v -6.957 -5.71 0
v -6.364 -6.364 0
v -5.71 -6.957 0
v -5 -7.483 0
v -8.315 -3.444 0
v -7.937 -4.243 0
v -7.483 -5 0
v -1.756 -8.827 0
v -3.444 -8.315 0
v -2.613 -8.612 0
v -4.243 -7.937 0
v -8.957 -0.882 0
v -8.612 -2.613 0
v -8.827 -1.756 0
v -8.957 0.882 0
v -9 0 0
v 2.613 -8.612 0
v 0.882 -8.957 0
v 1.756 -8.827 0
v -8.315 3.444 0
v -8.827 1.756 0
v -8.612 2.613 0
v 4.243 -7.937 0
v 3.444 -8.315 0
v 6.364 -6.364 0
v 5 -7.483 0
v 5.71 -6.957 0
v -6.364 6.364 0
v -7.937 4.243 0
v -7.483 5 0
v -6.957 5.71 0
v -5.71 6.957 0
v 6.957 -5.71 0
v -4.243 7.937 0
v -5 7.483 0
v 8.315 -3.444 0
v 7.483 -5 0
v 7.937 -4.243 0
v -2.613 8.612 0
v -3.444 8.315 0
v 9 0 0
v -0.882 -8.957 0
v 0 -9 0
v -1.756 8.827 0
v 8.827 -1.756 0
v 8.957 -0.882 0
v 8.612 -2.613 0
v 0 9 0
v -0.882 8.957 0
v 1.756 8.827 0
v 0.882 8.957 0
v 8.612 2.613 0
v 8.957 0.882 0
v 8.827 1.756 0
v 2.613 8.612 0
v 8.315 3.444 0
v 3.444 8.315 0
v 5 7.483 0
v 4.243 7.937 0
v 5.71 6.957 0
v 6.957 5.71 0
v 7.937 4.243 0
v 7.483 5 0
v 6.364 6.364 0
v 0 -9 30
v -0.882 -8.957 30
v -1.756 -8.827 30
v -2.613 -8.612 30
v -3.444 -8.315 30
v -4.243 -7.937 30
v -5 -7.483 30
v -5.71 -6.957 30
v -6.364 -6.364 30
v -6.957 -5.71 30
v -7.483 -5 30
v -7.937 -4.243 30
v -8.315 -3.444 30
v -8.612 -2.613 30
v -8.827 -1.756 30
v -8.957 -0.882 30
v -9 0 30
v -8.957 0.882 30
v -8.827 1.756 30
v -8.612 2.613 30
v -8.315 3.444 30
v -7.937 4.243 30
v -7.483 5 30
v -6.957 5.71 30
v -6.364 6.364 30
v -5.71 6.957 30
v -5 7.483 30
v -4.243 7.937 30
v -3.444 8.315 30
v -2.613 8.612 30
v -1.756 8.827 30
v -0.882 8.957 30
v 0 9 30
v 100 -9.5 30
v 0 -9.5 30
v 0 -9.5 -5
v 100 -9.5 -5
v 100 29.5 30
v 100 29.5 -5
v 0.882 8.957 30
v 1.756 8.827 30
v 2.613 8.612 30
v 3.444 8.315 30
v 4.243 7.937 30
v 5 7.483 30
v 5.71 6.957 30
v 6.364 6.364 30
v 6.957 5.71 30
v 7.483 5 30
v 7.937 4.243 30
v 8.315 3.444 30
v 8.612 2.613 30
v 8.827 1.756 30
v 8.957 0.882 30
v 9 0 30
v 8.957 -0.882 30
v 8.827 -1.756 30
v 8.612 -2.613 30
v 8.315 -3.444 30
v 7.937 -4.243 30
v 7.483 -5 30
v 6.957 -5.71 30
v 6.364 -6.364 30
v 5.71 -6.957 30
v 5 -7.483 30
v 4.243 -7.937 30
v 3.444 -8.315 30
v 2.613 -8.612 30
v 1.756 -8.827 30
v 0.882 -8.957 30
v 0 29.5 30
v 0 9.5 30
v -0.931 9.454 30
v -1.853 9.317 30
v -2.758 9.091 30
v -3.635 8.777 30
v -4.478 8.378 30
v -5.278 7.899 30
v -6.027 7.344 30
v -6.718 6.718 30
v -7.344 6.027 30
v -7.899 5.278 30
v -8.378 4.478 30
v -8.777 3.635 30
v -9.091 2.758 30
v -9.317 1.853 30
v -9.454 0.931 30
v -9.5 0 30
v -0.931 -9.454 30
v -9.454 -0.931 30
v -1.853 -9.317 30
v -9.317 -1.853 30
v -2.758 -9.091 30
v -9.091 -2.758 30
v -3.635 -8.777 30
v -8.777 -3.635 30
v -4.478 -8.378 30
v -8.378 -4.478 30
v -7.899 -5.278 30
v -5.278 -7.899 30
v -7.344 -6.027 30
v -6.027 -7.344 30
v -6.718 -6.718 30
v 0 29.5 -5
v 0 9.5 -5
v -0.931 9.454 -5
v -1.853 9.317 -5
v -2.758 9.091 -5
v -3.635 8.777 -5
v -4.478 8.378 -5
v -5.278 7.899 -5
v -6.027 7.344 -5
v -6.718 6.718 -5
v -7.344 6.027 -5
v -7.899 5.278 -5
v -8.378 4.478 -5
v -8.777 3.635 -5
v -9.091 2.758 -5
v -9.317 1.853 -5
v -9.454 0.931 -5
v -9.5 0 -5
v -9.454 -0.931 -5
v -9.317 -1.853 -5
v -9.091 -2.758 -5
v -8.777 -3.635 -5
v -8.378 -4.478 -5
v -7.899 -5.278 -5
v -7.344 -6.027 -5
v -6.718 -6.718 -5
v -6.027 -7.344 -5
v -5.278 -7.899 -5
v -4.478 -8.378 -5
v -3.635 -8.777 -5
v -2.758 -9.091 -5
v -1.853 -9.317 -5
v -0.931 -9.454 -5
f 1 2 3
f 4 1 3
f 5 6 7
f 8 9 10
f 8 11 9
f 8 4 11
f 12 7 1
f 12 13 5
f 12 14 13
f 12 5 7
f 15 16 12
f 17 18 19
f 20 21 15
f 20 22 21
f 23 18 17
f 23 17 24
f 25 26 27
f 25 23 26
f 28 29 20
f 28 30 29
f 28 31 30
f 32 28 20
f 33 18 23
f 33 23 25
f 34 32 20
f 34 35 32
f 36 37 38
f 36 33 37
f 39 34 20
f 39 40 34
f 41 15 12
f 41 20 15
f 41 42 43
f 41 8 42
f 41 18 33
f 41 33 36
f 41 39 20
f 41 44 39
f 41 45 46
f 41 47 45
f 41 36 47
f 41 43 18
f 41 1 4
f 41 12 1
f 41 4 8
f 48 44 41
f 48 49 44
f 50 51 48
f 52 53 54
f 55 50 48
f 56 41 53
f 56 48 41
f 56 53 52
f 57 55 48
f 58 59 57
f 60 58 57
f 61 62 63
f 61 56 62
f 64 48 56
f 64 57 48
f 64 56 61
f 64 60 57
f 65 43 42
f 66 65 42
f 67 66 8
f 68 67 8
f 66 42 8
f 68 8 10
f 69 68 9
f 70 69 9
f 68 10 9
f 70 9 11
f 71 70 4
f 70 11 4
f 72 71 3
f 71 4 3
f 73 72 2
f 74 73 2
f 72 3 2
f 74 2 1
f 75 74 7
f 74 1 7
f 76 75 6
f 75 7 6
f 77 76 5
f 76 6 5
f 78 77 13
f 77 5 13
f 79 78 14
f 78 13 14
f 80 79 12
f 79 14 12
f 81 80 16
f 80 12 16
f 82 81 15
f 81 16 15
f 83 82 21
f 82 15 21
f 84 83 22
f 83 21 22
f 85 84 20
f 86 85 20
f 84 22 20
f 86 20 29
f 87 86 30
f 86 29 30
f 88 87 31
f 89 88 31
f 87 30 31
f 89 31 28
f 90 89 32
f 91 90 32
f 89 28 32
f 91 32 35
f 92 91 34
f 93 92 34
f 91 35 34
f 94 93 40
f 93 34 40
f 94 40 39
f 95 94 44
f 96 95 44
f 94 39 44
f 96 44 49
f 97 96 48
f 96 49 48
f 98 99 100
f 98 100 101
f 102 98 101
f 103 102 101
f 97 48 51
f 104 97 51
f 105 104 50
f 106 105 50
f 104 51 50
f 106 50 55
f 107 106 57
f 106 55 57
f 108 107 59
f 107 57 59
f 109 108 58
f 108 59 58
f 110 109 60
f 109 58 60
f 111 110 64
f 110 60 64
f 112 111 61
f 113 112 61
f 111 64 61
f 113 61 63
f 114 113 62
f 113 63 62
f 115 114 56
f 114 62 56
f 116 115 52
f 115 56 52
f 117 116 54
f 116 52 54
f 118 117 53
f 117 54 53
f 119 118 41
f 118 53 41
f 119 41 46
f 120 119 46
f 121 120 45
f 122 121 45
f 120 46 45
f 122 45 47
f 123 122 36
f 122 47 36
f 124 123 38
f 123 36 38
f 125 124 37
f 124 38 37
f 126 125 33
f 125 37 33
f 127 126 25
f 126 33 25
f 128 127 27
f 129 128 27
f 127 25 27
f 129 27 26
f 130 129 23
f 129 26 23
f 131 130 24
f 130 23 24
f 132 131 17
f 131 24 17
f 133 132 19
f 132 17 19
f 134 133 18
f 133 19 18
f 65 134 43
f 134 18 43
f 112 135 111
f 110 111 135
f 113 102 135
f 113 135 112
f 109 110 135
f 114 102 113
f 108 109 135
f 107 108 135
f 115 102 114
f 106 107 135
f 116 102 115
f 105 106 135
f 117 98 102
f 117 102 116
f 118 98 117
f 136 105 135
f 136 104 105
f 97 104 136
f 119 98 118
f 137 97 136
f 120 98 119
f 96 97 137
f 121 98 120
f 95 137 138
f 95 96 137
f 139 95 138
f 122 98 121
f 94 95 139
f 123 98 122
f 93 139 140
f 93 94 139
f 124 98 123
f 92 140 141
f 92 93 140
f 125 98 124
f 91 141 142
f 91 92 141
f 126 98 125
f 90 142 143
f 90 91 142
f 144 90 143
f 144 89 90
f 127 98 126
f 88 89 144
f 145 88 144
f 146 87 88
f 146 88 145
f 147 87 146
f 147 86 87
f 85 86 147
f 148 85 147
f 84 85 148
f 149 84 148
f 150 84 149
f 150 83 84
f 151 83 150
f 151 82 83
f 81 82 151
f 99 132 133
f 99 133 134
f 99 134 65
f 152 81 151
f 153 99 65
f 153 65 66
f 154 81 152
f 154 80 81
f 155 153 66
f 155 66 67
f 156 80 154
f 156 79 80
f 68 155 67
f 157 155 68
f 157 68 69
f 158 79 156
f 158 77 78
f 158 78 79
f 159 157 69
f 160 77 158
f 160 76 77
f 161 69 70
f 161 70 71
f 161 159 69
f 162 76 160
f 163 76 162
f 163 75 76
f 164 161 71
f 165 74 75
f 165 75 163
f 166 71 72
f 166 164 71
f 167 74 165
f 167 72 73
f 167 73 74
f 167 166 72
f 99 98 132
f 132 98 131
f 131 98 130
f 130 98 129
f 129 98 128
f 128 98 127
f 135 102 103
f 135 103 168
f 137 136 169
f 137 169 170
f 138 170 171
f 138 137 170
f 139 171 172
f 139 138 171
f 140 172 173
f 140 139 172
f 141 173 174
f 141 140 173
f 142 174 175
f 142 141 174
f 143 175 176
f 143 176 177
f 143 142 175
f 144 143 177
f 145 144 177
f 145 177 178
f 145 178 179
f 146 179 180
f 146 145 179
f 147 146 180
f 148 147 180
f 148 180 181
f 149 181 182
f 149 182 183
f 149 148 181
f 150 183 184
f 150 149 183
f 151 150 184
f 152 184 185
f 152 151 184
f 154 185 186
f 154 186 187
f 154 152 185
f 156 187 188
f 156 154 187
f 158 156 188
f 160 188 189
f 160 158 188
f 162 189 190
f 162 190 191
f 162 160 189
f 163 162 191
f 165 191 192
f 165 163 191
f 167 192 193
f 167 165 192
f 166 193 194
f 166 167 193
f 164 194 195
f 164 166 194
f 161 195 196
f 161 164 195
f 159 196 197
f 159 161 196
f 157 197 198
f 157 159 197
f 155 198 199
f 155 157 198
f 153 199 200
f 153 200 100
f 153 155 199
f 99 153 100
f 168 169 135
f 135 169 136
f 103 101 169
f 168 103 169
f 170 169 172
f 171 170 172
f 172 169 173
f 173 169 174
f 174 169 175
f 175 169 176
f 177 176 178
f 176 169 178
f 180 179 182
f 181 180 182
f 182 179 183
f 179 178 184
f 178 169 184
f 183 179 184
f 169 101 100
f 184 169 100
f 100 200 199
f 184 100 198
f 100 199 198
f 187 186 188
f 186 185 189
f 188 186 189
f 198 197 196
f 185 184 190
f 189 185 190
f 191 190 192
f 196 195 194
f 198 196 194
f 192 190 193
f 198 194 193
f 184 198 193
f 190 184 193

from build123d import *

# Parameters (mm, degrees)
F1_DEPTH = 30
F2_DEPTH = 20
F3_DEPTH = 20
F4_DEPTH = 15


with BuildPart() as f1:
    # F0 (on Top) → F1 (new body)
    with BuildSketch(Plane.XY):
        with BuildLine():
            ThreePointArc((0, 9), (6.3639610307, 6.3639610307), (9, 0))
            ThreePointArc((9, 0), (6.3639610307, -6.3639610307), (0, -9))
            Line((0, -9), (0, -9.5))
            ThreePointArc((0, -9.5), (6.7175144213, -6.7175144213), (9.5, 0))
            ThreePointArc((9.5, 0), (6.7175144213, 6.7175144213), (0, 9.5))
            Line((0, 9.5), (0, 9))
        make_face()
        with BuildLine():
            ThreePointArc((0, -9), (-9, 0), (0, 9))
            Line((0, 9), (0, 9.5))
            ThreePointArc((0, 9.5), (-9.5, 0), (0, -9.5))
            Line((0, -9.5), (0, -9))
        make_face()
        with BuildLine():
            Line((100, 9.5), (0, 9.5))
            ThreePointArc((0, 9.5), (6.7175144213, 6.7175144213), (9.5, 0))
            ThreePointArc((9.5, 0), (6.7175144213, -6.7175144213), (0, -9.5))
            Line((0, -9.5), (100, -9.5))
            Line((100, -9.5), (100, 9.5))
        make_face()
    extrude(amount=F1_DEPTH)

    # F0 (on Top) → F2 (join)
    with BuildSketch(Plane.XY):
        with BuildLine():
            Line((100, 9.5), (0, 9.5))
            ThreePointArc((0, 9.5), (6.7175144213, 6.7175144213), (9.5, 0))
            ThreePointArc((9.5, 0), (6.7175144213, -6.7175144213), (0, -9.5))
            Line((0, -9.5), (100, -9.5))
            Line((100, -9.5), (100, 9.5))
        make_face()
        with BuildLine():
            ThreePointArc((0, 9), (6.3639610307, 6.3639610307), (9, 0))
            ThreePointArc((9, 0), (6.3639610307, -6.3639610307), (0, -9))
            Line((0, -9), (0, -9.5))
            ThreePointArc((0, -9.5), (6.7175144213, -6.7175144213), (9.5, 0))
            ThreePointArc((9.5, 0), (6.7175144213, 6.7175144213), (0, 9.5))
            Line((0, 9.5), (0, 9))
        make_face()
        with BuildLine():
            ThreePointArc((0, -9), (6.3639610307, -6.3639610307), (9, 0))
            ThreePointArc((9, 0), (6.3639610307, 6.3639610307), (0, 9))
            Line((0, 9), (0, 0))
            Line((0, 0), (0, -9))
        make_face()
        with BuildLine():
            ThreePointArc((0, -9), (-9, 0), (0, 9))
            Line((0, 9), (0, 9.5))
            ThreePointArc((0, 9.5), (-9.5, 0), (0, -9.5))
            Line((0, -9.5), (0, -9))
        make_face()
        with BuildLine():
            Line((0, 0), (0, 9))
            ThreePointArc((0, 9), (-9, 0), (0, -9))
            Line((0, -9), (0, 0))
        make_face()
    extrude(amount=-F2_DEPTH)

    # F3 (add): a face of the model
    f3_faces = [f1.faces().sort_by_distance(p)[0] for p in [
        (50, 9.5, 5),
    ]]
    extrude(f3_faces, amount=F3_DEPTH)

    # F4 (cut): a face of the model
    f4_faces = [f1.faces().sort_by_distance(p)[0] for p in [
        (48.1048371306, 9.6492512785, -20),
    ]]
    extrude(f4_faces, amount=-F4_DEPTH, mode=Mode.SUBTRACT)


solid = f1.part
